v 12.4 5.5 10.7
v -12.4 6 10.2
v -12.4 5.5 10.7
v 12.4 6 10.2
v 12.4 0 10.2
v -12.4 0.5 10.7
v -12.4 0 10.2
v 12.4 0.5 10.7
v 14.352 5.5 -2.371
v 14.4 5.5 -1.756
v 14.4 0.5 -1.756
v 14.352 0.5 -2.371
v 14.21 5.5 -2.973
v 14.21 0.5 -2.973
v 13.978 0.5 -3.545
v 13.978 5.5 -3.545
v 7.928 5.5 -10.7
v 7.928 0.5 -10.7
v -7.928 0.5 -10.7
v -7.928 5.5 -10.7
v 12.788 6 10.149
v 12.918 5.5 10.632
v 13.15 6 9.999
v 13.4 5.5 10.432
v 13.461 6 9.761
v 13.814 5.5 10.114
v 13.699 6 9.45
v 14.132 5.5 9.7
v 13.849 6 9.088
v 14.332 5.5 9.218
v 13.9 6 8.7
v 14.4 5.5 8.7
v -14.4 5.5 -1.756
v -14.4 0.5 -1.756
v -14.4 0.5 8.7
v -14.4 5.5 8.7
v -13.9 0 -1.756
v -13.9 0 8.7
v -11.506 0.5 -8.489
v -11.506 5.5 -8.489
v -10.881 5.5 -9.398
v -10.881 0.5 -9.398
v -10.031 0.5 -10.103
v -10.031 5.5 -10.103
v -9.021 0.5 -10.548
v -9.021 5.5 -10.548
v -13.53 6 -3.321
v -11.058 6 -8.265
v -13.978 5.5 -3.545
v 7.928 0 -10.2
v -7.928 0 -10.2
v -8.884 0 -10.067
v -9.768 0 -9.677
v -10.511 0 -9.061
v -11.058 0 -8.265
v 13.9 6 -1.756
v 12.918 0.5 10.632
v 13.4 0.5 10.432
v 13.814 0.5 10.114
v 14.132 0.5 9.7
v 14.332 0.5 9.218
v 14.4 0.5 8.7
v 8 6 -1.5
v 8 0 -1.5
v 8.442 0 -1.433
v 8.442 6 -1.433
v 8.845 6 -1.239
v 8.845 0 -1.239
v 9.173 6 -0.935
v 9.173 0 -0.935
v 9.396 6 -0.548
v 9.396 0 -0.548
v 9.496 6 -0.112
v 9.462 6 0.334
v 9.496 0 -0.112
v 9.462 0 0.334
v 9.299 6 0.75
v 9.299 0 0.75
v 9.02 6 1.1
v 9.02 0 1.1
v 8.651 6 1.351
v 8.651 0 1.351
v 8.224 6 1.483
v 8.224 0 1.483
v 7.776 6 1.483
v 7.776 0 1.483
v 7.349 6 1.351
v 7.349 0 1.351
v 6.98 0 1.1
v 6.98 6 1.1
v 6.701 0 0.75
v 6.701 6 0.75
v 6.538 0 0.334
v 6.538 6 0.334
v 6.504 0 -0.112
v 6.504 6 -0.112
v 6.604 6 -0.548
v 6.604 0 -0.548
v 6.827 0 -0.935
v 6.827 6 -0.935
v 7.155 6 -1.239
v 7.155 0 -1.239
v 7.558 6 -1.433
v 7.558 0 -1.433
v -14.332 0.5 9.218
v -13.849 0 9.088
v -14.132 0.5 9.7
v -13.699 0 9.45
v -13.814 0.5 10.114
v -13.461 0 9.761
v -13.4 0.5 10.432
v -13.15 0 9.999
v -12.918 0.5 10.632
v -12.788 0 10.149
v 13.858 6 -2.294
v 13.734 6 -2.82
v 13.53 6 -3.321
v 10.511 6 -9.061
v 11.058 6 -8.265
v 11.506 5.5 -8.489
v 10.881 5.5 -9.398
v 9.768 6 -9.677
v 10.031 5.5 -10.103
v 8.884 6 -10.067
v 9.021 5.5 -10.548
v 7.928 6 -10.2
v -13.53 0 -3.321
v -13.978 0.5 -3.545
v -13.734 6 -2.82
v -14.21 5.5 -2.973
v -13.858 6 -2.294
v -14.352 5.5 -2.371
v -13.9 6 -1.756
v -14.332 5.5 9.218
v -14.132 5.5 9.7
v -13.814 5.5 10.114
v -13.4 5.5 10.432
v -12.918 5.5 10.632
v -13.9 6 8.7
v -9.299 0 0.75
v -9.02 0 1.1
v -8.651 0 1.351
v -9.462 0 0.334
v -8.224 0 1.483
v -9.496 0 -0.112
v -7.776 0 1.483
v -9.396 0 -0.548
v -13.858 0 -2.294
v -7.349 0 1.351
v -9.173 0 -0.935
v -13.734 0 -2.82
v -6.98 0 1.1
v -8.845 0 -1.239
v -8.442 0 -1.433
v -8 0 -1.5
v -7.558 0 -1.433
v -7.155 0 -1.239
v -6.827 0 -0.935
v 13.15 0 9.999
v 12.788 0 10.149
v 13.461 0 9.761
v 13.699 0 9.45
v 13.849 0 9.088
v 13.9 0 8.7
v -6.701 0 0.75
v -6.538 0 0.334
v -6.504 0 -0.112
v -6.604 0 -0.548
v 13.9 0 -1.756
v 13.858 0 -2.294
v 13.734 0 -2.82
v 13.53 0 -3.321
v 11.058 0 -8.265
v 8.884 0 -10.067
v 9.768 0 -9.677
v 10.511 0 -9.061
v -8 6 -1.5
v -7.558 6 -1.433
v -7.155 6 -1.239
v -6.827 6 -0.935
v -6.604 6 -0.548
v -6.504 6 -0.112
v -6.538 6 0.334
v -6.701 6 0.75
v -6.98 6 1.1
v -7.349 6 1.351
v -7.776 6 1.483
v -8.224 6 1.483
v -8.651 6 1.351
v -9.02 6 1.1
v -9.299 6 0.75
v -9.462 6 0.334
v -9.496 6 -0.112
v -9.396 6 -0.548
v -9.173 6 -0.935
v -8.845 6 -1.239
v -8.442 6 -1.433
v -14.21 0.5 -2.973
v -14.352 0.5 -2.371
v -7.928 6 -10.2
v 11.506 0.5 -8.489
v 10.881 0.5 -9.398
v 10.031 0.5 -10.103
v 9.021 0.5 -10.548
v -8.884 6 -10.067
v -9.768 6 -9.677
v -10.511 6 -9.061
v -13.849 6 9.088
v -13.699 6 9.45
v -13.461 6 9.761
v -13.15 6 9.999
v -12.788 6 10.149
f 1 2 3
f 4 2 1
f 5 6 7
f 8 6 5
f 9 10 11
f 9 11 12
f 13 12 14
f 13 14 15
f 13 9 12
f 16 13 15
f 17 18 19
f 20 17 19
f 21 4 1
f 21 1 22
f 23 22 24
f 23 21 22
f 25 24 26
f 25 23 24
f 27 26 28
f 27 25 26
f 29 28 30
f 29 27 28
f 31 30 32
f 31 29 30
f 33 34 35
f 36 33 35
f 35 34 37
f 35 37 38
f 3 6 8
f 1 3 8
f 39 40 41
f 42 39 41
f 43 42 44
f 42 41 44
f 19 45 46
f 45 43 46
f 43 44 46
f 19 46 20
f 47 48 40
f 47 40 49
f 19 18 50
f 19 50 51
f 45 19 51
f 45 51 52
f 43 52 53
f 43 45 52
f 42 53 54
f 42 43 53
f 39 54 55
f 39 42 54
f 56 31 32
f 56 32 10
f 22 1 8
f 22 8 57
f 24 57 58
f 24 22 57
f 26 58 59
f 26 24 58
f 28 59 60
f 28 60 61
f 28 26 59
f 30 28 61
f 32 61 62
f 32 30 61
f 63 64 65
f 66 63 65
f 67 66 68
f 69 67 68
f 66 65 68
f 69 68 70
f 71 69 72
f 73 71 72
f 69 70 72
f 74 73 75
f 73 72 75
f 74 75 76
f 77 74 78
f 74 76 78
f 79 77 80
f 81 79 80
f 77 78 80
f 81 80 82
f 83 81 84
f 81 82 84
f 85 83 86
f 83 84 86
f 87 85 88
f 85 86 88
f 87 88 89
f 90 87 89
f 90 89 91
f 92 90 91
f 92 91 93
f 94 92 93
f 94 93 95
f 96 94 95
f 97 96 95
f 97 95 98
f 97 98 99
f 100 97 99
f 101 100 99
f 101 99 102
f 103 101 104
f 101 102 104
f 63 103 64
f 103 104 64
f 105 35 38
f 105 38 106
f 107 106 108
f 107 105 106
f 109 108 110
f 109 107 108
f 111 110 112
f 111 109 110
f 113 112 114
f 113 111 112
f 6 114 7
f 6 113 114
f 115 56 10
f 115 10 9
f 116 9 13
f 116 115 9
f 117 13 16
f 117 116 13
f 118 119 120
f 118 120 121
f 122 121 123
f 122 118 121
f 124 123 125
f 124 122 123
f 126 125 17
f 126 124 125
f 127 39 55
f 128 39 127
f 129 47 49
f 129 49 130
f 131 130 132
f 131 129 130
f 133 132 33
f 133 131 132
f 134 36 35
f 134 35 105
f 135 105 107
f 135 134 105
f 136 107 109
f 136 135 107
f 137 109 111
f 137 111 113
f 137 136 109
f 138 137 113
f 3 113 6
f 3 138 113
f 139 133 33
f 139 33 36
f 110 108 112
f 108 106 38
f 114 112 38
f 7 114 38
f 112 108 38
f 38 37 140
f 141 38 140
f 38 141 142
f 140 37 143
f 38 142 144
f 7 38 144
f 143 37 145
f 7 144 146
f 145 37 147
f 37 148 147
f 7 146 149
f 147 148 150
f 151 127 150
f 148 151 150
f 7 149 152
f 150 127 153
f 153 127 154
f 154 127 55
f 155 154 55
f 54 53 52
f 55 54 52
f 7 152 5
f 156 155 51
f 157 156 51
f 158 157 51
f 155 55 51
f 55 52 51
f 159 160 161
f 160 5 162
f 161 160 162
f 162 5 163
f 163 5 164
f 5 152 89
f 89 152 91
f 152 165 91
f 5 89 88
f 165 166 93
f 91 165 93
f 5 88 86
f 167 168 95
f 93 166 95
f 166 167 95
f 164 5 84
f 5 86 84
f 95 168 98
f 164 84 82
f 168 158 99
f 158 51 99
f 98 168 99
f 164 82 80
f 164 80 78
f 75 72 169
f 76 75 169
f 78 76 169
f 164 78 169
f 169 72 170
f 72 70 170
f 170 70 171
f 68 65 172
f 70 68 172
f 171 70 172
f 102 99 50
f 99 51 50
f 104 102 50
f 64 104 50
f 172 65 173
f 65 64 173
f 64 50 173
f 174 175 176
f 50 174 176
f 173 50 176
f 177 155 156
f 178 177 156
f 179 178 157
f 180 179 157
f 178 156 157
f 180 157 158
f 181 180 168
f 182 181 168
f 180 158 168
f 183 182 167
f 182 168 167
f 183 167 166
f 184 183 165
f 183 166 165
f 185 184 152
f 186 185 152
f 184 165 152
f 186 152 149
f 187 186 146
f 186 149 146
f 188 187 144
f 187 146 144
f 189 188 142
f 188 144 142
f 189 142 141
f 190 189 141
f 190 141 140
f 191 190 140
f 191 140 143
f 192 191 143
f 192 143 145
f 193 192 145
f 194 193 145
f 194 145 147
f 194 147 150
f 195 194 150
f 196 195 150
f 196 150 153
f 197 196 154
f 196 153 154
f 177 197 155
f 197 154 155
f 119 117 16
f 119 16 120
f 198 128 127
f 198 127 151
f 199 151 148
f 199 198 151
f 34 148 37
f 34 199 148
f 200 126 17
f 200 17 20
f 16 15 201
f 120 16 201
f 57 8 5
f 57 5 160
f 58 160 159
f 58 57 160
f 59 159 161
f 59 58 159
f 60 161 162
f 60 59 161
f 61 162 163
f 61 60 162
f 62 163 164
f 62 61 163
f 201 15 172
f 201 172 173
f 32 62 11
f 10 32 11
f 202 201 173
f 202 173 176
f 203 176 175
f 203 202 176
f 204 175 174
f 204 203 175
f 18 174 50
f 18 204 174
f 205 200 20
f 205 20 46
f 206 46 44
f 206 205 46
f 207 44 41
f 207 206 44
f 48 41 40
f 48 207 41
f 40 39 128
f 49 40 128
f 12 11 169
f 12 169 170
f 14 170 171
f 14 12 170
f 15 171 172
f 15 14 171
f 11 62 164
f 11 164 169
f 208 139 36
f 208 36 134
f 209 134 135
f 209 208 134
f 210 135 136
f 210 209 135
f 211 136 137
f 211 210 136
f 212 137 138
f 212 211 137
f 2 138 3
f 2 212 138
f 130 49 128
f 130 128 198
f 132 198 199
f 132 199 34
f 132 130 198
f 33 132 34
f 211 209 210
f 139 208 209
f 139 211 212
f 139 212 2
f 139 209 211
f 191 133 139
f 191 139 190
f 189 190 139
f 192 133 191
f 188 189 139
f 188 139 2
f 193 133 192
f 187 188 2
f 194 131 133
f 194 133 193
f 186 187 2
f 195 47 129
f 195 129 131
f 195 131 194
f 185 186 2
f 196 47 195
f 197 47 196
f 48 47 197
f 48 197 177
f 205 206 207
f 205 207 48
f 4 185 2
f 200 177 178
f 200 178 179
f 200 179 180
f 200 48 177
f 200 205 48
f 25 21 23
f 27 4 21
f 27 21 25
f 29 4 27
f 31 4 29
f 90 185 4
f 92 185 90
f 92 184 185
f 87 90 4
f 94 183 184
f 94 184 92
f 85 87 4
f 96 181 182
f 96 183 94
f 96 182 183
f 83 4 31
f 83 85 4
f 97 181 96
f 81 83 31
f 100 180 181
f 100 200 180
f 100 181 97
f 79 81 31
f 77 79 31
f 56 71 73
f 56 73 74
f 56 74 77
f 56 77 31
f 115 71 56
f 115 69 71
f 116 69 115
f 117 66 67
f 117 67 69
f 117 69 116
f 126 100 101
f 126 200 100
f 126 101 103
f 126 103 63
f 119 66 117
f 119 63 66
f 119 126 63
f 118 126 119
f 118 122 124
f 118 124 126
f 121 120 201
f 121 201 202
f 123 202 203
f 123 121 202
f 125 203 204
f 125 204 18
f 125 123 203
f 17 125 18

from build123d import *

# Parameters (mm, degrees)
BOSS_EXTRUDE1_DEPTH = 6
FILLET1_R           = 4
FILLET2_R           = 2
SKETCH2_R           = 1.5
CUT_EXTRUDE1_DEPTH  = 6
CHAMFER1_SIZE       = 0.5


with BuildPart() as part:
    # Sketch1 → Boss-Extrude1 (new body)
    with BuildSketch(Plane(origin=(0, 0, 0), x_dir=(1, 0, 0), z_dir=(0, 1, 0))):
        Polygon((-10.4, 10.7), (-14.4, 2.7), (-14.4, -10.7), (14.4, -10.7), (14.4, 2.7), (10.4, 10.7), align=None)
    extrude(amount=BOSS_EXTRUDE1_DEPTH)

    # Fillet1
    fillet1_edges = [part.edges().sort_by_distance(p)[0] for p in [
        (14.4, 3, -2.7),
        (-14.4, 3, -2.7),
        (-10.4, 3, -10.7),
        (10.4, 3, -10.7),
    ]]
    fillet(fillet1_edges, radius=FILLET1_R)

    # Fillet2
    fillet2_edges = [part.edges().sort_by_distance(p)[0] for p in [
        (14.4, 3, 10.7),
        (-14.4, 3, 10.7),
    ]]
    fillet(fillet2_edges, radius=FILLET2_R)

    # Sketch2 → Cut-Extrude1 (cut)
    with BuildSketch(Plane.XZ):
        with Locations(Location((-8, 0, 0), (0, 0, 270))):
            Circle(SKETCH2_R)
        with Locations(Location((8, 0, 0), (0, 0, 270))):
            Circle(SKETCH2_R)
    extrude(amount=-CUT_EXTRUDE1_DEPTH, mode=Mode.SUBTRACT)

    # Chamfer1
    chamfer1_edges = [part.edges().sort_by_distance(p)[0] for p in [
        (12.741640786, 0, -6.016718427),
        (-12.741640786, 0, -6.016718427),
        (0, 0, -10.7),
        (10.030788493, 0, -10.102603233),
        (-10.030788493, 0, -10.102603233),
        (14.292995958, 0, -2.674739772),
        (-14.292995958, 0, -2.674739772),
        (-12.741640786, 6, -6.016718427),
        (12.741640786, 6, -6.016718427),
        (0, 6, -10.7),
        (10.030788493, 6, -10.102603233),
        (-10.030788493, 6, -10.102603233),
        (14.292995958, 6, -2.674739772),
        (-14.292995958, 6, -2.674739772),
        (14.4, 0, 3.472135955),
        (14.4, 6, 3.472135955),
        (-14.4, 0, 3.472135955),
        (0, 0, 10.7),
        (-13.814213562, 0, 10.114213562),
        (13.814213562, 0, 10.114213562),
        (0, 6, 10.7),
        (-14.4, 6, 3.472135955),
        (-13.814213562, 6, 10.114213562),
        (13.814213562, 6, 10.114213562),
    ]]
    chamfer(chamfer1_edges, length=CHAMFER1_SIZE)


solid = part.part
